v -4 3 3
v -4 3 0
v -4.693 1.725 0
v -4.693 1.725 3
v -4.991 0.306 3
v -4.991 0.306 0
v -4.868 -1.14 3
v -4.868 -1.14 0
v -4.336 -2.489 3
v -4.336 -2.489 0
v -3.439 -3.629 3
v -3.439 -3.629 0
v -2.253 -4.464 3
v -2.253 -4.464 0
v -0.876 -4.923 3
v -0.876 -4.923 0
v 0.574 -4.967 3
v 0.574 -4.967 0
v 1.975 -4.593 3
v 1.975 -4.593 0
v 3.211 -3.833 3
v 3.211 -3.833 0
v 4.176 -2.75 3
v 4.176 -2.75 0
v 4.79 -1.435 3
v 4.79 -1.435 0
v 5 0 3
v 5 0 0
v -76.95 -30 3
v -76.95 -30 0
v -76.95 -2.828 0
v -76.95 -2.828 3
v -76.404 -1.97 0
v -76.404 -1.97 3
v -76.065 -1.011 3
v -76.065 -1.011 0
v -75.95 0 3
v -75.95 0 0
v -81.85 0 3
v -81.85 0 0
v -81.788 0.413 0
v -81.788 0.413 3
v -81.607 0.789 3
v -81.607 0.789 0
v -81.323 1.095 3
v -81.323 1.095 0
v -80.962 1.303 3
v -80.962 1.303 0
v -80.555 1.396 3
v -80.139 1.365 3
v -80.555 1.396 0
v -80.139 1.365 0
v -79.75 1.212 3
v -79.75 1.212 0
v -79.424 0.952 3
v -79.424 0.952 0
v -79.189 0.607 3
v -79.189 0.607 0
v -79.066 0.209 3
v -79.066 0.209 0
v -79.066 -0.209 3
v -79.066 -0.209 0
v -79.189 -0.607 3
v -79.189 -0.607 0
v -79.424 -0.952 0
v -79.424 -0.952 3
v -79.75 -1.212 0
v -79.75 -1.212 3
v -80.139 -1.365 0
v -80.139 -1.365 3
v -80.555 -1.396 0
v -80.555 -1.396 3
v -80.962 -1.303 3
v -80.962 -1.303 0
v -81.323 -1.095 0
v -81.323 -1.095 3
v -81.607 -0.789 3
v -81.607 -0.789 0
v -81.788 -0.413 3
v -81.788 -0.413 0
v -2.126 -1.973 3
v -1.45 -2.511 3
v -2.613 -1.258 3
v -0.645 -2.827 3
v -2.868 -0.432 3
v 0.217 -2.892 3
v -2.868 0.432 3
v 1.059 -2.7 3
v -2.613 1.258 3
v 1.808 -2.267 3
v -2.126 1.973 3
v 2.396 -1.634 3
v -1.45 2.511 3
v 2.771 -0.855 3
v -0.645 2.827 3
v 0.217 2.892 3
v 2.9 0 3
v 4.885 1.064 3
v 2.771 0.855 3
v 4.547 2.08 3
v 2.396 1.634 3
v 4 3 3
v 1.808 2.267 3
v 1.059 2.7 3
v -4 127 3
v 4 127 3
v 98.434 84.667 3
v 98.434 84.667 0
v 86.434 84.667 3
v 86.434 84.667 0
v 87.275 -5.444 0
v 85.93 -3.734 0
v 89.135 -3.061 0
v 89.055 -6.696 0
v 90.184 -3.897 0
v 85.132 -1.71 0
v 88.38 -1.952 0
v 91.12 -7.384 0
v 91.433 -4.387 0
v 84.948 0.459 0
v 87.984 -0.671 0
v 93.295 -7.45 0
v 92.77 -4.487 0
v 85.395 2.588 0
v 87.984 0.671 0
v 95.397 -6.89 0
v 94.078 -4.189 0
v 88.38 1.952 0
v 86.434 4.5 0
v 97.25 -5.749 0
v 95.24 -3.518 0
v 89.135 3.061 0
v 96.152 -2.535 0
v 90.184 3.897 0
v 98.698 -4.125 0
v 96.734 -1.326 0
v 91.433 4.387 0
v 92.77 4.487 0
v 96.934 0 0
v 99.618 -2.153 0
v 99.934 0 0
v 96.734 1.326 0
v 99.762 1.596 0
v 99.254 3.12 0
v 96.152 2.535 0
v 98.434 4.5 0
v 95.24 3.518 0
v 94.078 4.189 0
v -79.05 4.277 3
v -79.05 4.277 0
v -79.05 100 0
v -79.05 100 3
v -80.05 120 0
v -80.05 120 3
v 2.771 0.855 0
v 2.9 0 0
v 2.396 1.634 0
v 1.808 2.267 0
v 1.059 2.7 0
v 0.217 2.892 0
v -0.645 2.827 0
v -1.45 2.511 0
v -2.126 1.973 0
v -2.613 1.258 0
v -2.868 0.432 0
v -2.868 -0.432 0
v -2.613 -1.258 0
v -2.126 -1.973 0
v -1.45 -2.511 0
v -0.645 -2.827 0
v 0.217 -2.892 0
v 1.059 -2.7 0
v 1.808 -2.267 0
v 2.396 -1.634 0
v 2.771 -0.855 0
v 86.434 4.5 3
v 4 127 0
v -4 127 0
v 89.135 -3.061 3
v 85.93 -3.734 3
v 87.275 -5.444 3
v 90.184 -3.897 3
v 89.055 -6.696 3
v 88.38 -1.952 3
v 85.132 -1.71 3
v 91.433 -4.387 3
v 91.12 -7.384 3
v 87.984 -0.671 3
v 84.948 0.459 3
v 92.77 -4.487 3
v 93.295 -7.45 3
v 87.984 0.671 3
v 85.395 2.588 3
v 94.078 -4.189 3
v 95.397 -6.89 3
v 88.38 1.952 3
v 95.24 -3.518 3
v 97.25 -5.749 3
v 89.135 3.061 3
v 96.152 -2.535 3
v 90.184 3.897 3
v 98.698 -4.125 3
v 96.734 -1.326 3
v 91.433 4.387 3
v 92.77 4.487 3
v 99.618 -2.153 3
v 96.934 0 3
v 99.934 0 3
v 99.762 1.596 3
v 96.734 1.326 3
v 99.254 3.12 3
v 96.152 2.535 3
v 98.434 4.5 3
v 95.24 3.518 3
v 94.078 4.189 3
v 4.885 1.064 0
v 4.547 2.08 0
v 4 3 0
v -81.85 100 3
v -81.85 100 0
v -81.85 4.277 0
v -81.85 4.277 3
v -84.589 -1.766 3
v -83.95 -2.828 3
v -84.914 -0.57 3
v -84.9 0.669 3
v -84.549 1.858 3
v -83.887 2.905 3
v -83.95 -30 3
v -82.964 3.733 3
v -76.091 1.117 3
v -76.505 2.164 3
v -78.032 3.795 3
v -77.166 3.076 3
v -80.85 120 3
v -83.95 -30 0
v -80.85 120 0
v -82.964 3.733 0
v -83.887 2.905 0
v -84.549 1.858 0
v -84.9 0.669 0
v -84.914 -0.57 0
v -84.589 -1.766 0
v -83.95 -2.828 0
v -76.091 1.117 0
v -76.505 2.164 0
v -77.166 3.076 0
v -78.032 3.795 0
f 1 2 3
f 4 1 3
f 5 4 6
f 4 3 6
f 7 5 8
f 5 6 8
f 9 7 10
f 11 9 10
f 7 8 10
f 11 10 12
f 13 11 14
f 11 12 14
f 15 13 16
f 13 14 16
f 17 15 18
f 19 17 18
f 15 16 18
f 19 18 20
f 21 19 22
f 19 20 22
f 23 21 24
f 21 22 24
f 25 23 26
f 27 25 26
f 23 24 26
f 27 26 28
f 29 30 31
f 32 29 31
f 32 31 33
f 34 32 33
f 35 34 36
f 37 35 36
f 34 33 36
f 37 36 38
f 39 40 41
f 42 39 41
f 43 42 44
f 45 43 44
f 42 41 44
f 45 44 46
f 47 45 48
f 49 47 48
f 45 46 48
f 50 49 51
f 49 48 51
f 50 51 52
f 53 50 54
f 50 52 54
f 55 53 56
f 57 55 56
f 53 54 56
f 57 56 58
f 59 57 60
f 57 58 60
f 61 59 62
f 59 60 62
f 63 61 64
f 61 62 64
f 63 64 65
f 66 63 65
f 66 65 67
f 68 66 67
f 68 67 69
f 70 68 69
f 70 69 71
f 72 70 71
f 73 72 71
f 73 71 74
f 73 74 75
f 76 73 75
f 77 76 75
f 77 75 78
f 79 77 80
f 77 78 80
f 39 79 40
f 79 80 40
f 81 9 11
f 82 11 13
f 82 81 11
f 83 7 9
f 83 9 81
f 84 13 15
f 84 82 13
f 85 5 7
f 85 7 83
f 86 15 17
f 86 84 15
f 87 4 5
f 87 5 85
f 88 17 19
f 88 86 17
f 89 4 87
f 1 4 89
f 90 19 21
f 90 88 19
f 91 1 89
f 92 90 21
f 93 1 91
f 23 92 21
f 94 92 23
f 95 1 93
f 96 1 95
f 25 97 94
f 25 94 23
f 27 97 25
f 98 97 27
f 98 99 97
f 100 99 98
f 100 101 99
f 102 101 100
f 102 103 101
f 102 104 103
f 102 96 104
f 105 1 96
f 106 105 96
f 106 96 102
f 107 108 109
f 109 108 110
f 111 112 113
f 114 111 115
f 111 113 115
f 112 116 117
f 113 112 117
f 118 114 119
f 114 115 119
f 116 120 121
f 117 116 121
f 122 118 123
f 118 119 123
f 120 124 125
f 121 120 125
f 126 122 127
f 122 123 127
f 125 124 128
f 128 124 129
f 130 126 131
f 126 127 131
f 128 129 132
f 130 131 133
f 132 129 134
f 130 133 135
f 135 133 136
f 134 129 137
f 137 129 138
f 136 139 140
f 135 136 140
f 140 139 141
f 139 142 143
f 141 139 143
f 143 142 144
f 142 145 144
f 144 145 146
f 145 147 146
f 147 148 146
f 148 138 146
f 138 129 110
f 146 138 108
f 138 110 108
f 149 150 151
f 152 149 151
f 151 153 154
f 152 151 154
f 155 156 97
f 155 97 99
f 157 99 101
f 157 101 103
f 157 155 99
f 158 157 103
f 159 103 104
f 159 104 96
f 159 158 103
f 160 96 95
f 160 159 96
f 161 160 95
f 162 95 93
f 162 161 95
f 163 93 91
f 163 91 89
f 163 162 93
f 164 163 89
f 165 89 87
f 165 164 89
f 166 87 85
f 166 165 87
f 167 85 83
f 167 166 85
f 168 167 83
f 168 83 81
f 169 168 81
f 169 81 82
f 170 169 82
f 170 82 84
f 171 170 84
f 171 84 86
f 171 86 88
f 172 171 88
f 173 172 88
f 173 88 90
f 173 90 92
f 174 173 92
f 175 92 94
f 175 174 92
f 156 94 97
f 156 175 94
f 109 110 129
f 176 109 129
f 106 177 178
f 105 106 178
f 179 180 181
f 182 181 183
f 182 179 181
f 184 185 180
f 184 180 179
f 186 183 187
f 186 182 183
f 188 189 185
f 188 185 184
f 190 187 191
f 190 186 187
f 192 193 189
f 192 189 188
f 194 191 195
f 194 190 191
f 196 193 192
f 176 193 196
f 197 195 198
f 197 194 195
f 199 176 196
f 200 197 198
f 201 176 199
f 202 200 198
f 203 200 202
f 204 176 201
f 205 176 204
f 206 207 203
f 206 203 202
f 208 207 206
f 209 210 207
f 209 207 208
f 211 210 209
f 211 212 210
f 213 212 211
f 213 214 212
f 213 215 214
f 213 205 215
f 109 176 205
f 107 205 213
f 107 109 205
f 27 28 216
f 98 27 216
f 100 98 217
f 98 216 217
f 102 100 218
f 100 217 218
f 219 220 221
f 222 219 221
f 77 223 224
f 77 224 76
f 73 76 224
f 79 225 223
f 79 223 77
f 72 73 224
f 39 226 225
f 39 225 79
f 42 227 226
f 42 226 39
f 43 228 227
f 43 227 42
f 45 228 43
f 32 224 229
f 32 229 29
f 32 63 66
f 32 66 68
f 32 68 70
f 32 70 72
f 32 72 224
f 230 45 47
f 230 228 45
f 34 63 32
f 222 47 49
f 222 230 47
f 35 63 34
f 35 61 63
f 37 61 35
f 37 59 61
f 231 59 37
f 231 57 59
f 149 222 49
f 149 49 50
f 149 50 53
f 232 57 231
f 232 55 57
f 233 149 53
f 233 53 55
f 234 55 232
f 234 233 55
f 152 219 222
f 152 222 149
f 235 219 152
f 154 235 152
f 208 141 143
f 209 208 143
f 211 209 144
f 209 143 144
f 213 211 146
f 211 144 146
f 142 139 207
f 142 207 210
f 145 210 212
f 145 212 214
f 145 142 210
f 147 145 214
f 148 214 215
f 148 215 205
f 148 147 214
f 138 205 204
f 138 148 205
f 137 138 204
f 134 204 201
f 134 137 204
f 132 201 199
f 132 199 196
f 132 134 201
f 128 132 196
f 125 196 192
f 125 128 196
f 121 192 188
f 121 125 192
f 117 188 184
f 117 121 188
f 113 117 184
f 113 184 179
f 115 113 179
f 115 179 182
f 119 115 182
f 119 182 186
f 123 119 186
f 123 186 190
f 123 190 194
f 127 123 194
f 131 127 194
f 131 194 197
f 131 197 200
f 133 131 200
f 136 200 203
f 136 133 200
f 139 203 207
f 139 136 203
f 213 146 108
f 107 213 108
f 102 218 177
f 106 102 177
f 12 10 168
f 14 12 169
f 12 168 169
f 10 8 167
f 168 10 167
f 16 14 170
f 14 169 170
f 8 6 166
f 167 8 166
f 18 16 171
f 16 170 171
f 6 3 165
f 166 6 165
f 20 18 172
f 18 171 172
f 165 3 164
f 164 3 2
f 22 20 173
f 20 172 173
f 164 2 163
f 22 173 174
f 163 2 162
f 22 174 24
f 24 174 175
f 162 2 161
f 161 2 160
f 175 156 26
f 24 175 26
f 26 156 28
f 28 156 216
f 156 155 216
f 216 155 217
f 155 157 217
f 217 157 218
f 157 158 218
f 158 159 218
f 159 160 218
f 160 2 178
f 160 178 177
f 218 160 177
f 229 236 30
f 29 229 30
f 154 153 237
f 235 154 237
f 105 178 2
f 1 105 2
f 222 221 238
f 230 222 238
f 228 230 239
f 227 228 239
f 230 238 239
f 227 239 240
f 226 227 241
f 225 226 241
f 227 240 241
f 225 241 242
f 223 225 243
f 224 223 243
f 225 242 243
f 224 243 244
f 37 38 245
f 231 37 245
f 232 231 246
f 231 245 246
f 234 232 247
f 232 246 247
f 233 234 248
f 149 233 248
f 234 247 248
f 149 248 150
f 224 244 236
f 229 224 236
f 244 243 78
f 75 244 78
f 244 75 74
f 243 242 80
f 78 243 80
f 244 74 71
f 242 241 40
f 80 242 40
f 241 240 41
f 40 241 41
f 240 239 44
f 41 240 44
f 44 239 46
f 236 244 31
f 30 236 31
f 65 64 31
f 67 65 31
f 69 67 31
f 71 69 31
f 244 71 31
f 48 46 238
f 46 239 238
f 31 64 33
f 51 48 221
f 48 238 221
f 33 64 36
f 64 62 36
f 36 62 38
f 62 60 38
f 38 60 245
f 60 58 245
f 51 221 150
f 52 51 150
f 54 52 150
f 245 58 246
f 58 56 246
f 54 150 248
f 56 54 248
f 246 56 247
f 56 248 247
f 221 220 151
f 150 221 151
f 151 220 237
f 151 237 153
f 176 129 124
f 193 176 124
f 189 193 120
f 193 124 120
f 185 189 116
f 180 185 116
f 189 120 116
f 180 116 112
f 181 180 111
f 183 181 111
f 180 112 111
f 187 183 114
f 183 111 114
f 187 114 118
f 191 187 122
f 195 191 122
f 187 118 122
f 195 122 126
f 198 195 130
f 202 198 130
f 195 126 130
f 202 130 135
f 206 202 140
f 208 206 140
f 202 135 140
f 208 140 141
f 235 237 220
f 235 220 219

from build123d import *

# Parameters (mm, degrees)
F1_DEPTH = 3
F0_R     = 2.9
F0_R_2   = 4.5
F2_SIZE2 = 20
F2_SIZE  = 1


with BuildPart() as f1:
    # F0 (on Top) → F1 (new body)
    with BuildSketch(Plane.XY):
        with BuildLine():
            Line((-81.8503187537, 120), (-81.8503187537, 4.2766809561))
            ThreePointArc((-81.8503187537, 4.2766809561), (-80.4503187537, 4.5), (-79.0503187537, 4.2766809561))
            Line((-79.0503187537, 4.2766809561), (-79.0503187537, 120))
            Line((-79.0503187537, 120), (-81.8503187537, 120))
        make_face()
        with BuildLine():
            ThreePointArc((-76.9503187537, -2.8284271247), (-80.4503187537, -4.5), (-83.9503187537, -2.8284271247))
            Line((-83.9503187537, -2.8284271247), (-83.9503187537, -30))
            Line((-83.9503187537, -30), (-76.9503187537, -30))
            Line((-76.9503187537, -30), (-76.9503187537, -2.8284271247))
        make_face()
        with BuildLine():
            ThreePointArc((-76.9503187537, 0), (-80.4503187537, -3.5), (-83.9503187537, 0))
            Line((-83.9503187537, 0), (-83.9503187537, -2.8284271247))
            ThreePointArc((-83.9503187537, -2.8284271247), (-80.4503187537, -4.5), (-76.9503187537, -2.8284271247))
            Line((-76.9503187537, -2.8284271247), (-76.9503187537, 0))
        make_face()
        with BuildLine():
            Line((-79.0503187537, 4.2766809561), (-79.0503187537, 3.2078029865))
            ThreePointArc((-79.0503187537, 3.2078029865), (-77.5220086609, 1.9170289513), (-76.9503187537, 0))
            Line((-76.9503187537, 0), (-76.9503187537, -2.8284271247))
            ThreePointArc((-76.9503187537, -2.8284271247), (-76.2076780666, -1.5), (-75.9503187537, 0))
            ThreePointArc((-75.9503187537, 0), (-76.8068314133, 2.6410225292), (-79.0503187537, 4.2766809561))
        make_face()
        with BuildLine():
            ThreePointArc((-79.0503187537, 0), (-80.4503187537, -1.4), (-81.8503187537, 0))
            Line((-81.8503187537, 0), (-83.9503187537, 0))
            ThreePointArc((-83.9503187537, 0), (-80.4503187537, -3.5), (-76.9503187537, 0))
            Line((-76.9503187537, 0), (-79.0503187537, 0))
        make_face()
        with BuildLine():
            ThreePointArc((-83.9503187537, 0), (-83.3786288466, 1.9170289513), (-81.8503187537, 3.2078029865))
            Line((-81.8503187537, 3.2078029865), (-81.8503187537, 4.2766809561))
            ThreePointArc((-81.8503187537, 4.2766809561), (-84.7657724043, 1.2754841394), (-83.9503187537, -2.8284271247))
            Line((-83.9503187537, -2.8284271247), (-83.9503187537, 0))
        make_face()
        with BuildLine():
            Line((-81.8503187537, 4.2766809561), (-81.8503187537, 3.2078029865))
            ThreePointArc((-81.8503187537, 3.2078029865), (-80.4503187537, 3.5), (-79.0503187537, 3.2078029865))
            Line((-79.0503187537, 3.2078029865), (-79.0503187537, 4.2766809561))
            ThreePointArc((-79.0503187537, 4.2766809561), (-80.4503187537, 4.5), (-81.8503187537, 4.2766809561))
        make_face()
        with BuildLine():
            Line((-81.8503187537, 3.2078029865), (-81.8503187537, 0))
            ThreePointArc((-81.8503187537, 0), (-80.4503187537, 1.4), (-79.0503187537, 0))
            Line((-79.0503187537, 0), (-79.0503187537, 3.2078029865))
            ThreePointArc((-79.0503187537, 3.2078029865), (-80.4503187537, 3.5), (-81.8503187537, 3.2078029865))
        make_face()
        with BuildLine():
            Line((-79.0503187537, 3.2078029865), (-79.0503187537, 0))
            Line((-79.0503187537, 0), (-76.9503187537, 0))
            ThreePointArc((-76.9503187537, 0), (-77.5220086609, 1.9170289513), (-79.0503187537, 3.2078029865))
        make_face()
        with BuildLine():
            Line((-83.9503187537, 0), (-81.8503187537, 0))
            Line((-81.8503187537, 0), (-81.8503187537, 3.2078029865))
            ThreePointArc((-81.8503187537, 3.2078029865), (-83.3786288466, 1.9170289513), (-83.9503187537, 0))
        make_face()
    extrude(amount=F1_DEPTH)

    # F2
    f2_edges = [f1.edges().sort_by_distance(p)[0] for p in [
        (-79.050319, 120, 1.5),
        (-81.850319, 120, 1.5),
    ]]
    f2_side = f1.faces().sort_by_distance((-80.450319, 120, 1.5))[0]
    chamfer(f2_edges, length=F2_SIZE, length2=F2_SIZE2, reference=f2_side)


with BuildPart() as f1b:
    # F0 (on Top) → F1, piece 2 (new body)
    with BuildSketch(Plane.XY):
        with BuildLine():
            Line((4, 3), (4, 0))
            ThreePointArc((4, 0), (0, -4), (-4, 0))
            Line((-4, 0), (-4, 3))
            ThreePointArc((-4, 3), (-1.5811388301, -4.7434164903), (5, 0))
            ThreePointArc((5, 0), (4.7434164903, 1.5811388301), (4, 3))
        make_face()
        with BuildLine():
            ThreePointArc((-4, 0), (0, -4), (4, 0))
            ThreePointArc((4, 0), (0, 4), (-4, 0))
        make_face()
        Circle(F0_R, mode=Mode.SUBTRACT)
        with BuildLine():
            ThreePointArc((-4, 0), (0, 4), (4, 0))
            Line((4, 0), (4, 3))
            ThreePointArc((4, 3), (0, 5), (-4, 3))
            Line((-4, 3), (-4, 0))
        make_face()
        with BuildLine():
            ThreePointArc((-4, 3), (0, 5), (4, 3))
            Line((4, 3), (4, 127))
            Line((4, 127), (-4, 127))
            Line((-4, 127), (-4, 3))
        make_face()
    extrude(amount=F1_DEPTH)


with BuildPart() as f1c:
    # F0 (on Top) → F1, piece 3 (new body)
    with BuildSketch(Plane.XY):
        with BuildLine():
            ThreePointArc((86.4340859056, 4.5), (92.4340859056, 7.5), (98.4340859056, 4.5))
            Line((98.4340859056, 4.5), (98.4340859056, 84.6666666667))
            Line((98.4340859056, 84.6666666667), (86.4340859056, 84.6666666667))
            Line((86.4340859056, 84.6666666667), (86.4340859056, 4.5))
        make_face()
        with BuildLine():
            Line((98.4340859056, 0), (98.4340859056, 4.5))
            ThreePointArc((98.4340859056, 4.5), (92.4340859056, 7.5), (86.4340859056, 4.5))
            Line((86.4340859056, 4.5), (86.4340859056, 0))
            ThreePointArc((86.4340859056, 0), (92.4340859056, 6), (98.4340859056, 0))
        make_face()
        with BuildLine():
            ThreePointArc((86.4340859056, 0), (92.4340859056, -6), (98.4340859056, 0))
            ThreePointArc((98.4340859056, 0), (92.4340859056, 6), (86.4340859056, 0))
        make_face()
        with Locations((92.4340859056, 0)):
            Circle(F0_R_2, mode=Mode.SUBTRACT)
        with BuildLine():
            ThreePointArc((86.4340859056, 4.5), (90.0623776604, -7.1151247354), (99.9340859056, 0))
            ThreePointArc((99.9340859056, 0), (99.5492106409, 2.3717082451), (98.4340859056, 4.5))
            Line((98.4340859056, 4.5), (98.4340859056, 0))
            ThreePointArc((98.4340859056, 0), (92.4340859056, -6), (86.4340859056, 0))
            Line((86.4340859056, 0), (86.4340859056, 4.5))
        make_face()
    extrude(amount=F1_DEPTH)


solid = Compound([f1.part, f1b.part, f1c.part])
